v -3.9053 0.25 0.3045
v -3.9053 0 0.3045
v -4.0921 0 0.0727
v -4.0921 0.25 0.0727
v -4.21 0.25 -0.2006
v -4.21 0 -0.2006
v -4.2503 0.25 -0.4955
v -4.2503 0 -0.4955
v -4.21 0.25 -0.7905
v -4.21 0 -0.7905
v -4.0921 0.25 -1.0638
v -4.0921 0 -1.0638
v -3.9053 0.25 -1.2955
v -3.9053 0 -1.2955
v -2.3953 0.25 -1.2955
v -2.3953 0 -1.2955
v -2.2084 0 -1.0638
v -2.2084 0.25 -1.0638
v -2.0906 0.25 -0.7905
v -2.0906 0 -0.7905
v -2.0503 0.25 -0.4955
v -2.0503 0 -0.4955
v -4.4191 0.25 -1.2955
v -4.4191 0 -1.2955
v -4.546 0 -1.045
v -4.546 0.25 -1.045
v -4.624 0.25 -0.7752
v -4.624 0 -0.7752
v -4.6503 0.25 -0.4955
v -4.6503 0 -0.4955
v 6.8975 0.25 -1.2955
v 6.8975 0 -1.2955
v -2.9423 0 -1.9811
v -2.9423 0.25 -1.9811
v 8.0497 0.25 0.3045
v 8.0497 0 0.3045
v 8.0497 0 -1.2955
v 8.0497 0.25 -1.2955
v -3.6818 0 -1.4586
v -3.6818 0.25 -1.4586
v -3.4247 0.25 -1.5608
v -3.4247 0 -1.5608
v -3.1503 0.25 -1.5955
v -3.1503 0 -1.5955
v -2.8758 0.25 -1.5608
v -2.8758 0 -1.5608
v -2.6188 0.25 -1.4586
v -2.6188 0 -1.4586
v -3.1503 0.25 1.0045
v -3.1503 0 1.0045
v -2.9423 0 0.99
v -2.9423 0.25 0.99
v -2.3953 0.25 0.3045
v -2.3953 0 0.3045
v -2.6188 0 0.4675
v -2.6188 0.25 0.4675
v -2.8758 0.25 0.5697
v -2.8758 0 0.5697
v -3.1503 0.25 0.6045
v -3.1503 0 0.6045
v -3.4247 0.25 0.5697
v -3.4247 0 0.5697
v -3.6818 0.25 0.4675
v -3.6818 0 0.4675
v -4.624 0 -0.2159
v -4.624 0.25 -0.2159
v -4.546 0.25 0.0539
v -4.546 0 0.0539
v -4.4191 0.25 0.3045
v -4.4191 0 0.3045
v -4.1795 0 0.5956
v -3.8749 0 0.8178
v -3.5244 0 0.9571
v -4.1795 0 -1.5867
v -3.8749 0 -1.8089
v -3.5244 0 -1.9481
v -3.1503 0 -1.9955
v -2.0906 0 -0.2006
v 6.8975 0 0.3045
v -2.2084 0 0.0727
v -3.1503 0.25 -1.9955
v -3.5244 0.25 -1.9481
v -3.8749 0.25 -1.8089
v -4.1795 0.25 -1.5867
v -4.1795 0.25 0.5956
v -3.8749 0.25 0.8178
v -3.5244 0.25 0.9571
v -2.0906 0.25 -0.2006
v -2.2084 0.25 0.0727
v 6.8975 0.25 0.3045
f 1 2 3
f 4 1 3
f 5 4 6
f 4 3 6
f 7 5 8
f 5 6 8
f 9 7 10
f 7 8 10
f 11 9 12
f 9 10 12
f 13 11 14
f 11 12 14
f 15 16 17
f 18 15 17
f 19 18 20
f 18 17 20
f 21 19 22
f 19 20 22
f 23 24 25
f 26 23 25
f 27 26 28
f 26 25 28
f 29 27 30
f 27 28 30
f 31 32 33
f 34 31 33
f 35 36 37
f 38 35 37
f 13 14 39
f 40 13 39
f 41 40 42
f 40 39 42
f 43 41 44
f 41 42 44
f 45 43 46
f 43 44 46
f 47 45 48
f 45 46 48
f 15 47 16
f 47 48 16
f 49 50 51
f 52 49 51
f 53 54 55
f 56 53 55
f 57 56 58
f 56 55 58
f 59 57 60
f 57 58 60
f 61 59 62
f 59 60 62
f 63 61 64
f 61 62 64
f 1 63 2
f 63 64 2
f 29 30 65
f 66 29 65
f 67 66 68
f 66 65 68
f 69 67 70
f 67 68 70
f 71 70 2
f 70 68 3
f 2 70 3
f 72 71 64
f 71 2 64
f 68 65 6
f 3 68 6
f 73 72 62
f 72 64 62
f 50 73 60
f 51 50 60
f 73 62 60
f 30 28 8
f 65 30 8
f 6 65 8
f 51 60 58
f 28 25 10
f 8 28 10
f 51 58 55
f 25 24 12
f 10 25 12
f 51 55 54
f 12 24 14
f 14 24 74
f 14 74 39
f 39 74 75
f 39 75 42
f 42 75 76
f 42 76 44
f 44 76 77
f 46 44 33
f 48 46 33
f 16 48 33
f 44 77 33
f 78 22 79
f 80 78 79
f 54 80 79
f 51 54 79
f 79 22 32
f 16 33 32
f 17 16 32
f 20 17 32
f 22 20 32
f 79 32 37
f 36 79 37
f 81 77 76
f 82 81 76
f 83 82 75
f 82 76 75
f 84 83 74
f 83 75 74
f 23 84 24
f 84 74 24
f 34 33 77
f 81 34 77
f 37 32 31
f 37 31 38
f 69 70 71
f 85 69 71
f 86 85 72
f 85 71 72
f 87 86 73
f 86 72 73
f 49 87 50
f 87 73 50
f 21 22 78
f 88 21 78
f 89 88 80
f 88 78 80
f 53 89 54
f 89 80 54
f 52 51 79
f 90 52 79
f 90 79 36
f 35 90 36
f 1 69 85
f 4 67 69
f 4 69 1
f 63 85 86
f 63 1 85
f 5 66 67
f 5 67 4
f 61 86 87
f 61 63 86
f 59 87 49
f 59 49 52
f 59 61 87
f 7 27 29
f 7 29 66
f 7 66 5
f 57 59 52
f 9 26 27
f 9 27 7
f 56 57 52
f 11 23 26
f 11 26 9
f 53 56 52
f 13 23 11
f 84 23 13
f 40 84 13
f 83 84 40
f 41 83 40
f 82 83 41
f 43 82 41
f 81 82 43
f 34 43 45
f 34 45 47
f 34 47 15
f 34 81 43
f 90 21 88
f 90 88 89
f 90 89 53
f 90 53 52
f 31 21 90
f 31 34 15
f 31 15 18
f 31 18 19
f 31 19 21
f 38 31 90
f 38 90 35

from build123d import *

# Parameters (mm, degrees)
SKETCH1_W           = 1.152195829
SKETCH1_H           = 1.6
BOSS_EXTRUDE3_DEPTH = 0.25


with BuildPart() as part:
    # Sketch1 → Boss-Extrude3 (new body)
    with BuildSketch(Plane(origin=(0, 0, 0), x_dir=(1, 0, 0), z_dir=(0, 1, 0))):
        with BuildLine():
            Line((-2.942295951, 1.981055848), (-3.150287356, 1.995545977))
            ThreePointArc((-3.150287356, 1.995545977), (-3.874856194, 1.808938531), (-4.41914511, 1.295545977))
            Line((-4.41914511, 1.295545977), (-3.9052708, 1.295545977))
            ThreePointArc((-3.9052708, 1.295545977), (-3.150287356, 1.595545977), (-2.395303913, 1.295545977))
            Line((-2.395303913, 1.295545977), (-1.881429602, 1.295545977))
            ThreePointArc((-1.881429602, 1.295545977), (-2.336191658, 1.755406364), (-2.942295951, 1.981055848))
        make_face()
        with BuildLine():
            Line((6.897516815, 1.295545977), (-2.942295951, 1.981055848))
            ThreePointArc((-2.942295951, 1.981055848), (-2.336191658, 1.755406364), (-1.881429602, 1.295545977))
            Line((-1.881429602, 1.295545977), (6.897516815, 1.295545977))
        make_face()
        with BuildLine():
            Line((-3.9052708, 1.295545977), (-4.41914511, 1.295545977))
            ThreePointArc((-4.41914511, 1.295545977), (-4.591343676, 0.91190722), (-4.650287356, 0.495545977))
            ThreePointArc((-4.650287356, 0.495545977), (-4.591343676, 0.079184734), (-4.41914511, -0.304454023))
            Line((-4.41914511, -0.304454023), (-3.9052708, -0.304454023))
            ThreePointArc((-3.9052708, -0.304454023), (-4.250287356, 0.495545977), (-3.9052708, 1.295545977))
        make_face()
        with BuildLine():
            ThreePointArc((-1.650287356, 0.495545977), (-1.709231037, 0.91190722), (-1.881429602, 1.295545977))
            Line((-1.881429602, 1.295545977), (-2.395303913, 1.295545977))
            ThreePointArc((-2.395303913, 1.295545977), (-2.140217609, 0.931159459), (-2.050287356, 0.495545977))
            ThreePointArc((-2.050287356, 0.495545977), (-2.140217609, 0.059932495), (-2.395303913, -0.304454023))
            Line((-2.395303913, -0.304454023), (-1.881429602, -0.304454023))
            ThreePointArc((-1.881429602, -0.304454023), (-1.709231037, 0.079184734), (-1.650287356, 0.495545977))
        make_face()
        with BuildLine():
            ThreePointArc((-2.395303913, -0.304454023), (-3.150287356, -0.604454023), (-3.9052708, -0.304454023))
            Line((-3.9052708, -0.304454023), (-4.41914511, -0.304454023))
            ThreePointArc((-4.41914511, -0.304454023), (-3.874856194, -0.817846577), (-3.150287356, -1.004454023))
            Line((-3.150287356, -1.004454023), (-2.942295951, -0.989963893))
            ThreePointArc((-2.942295951, -0.989963893), (-2.336191658, -0.76431441), (-1.881429602, -0.304454023))
            Line((-1.881429602, -0.304454023), (-2.395303913, -0.304454023))
        make_face()
        with BuildLine():
            Line((6.897516815, -0.304454023), (6.897516815, 1.295545977))
            Line((6.897516815, 1.295545977), (-1.881429602, 1.295545977))
            ThreePointArc((-1.881429602, 1.295545977), (-1.709231037, 0.91190722), (-1.650287356, 0.495545977))
            ThreePointArc((-1.650287356, 0.495545977), (-1.709231037, 0.079184734), (-1.881429602, -0.304454023))
            Line((-1.881429602, -0.304454023), (6.897516815, -0.304454023))
        make_face()
        with BuildLine():
            Line((-2.942295951, -0.989963893), (6.897516815, -0.304454023))
            Line((6.897516815, -0.304454023), (-1.881429602, -0.304454023))
            ThreePointArc((-1.881429602, -0.304454023), (-2.336191658, -0.76431441), (-2.942295951, -0.989963893))
        make_face()
        with Locations((7.47361473, 0.495545977)):
            Rectangle(SKETCH1_W, SKETCH1_H)
    extrude(amount=BOSS_EXTRUDE3_DEPTH)


solid = part.part
